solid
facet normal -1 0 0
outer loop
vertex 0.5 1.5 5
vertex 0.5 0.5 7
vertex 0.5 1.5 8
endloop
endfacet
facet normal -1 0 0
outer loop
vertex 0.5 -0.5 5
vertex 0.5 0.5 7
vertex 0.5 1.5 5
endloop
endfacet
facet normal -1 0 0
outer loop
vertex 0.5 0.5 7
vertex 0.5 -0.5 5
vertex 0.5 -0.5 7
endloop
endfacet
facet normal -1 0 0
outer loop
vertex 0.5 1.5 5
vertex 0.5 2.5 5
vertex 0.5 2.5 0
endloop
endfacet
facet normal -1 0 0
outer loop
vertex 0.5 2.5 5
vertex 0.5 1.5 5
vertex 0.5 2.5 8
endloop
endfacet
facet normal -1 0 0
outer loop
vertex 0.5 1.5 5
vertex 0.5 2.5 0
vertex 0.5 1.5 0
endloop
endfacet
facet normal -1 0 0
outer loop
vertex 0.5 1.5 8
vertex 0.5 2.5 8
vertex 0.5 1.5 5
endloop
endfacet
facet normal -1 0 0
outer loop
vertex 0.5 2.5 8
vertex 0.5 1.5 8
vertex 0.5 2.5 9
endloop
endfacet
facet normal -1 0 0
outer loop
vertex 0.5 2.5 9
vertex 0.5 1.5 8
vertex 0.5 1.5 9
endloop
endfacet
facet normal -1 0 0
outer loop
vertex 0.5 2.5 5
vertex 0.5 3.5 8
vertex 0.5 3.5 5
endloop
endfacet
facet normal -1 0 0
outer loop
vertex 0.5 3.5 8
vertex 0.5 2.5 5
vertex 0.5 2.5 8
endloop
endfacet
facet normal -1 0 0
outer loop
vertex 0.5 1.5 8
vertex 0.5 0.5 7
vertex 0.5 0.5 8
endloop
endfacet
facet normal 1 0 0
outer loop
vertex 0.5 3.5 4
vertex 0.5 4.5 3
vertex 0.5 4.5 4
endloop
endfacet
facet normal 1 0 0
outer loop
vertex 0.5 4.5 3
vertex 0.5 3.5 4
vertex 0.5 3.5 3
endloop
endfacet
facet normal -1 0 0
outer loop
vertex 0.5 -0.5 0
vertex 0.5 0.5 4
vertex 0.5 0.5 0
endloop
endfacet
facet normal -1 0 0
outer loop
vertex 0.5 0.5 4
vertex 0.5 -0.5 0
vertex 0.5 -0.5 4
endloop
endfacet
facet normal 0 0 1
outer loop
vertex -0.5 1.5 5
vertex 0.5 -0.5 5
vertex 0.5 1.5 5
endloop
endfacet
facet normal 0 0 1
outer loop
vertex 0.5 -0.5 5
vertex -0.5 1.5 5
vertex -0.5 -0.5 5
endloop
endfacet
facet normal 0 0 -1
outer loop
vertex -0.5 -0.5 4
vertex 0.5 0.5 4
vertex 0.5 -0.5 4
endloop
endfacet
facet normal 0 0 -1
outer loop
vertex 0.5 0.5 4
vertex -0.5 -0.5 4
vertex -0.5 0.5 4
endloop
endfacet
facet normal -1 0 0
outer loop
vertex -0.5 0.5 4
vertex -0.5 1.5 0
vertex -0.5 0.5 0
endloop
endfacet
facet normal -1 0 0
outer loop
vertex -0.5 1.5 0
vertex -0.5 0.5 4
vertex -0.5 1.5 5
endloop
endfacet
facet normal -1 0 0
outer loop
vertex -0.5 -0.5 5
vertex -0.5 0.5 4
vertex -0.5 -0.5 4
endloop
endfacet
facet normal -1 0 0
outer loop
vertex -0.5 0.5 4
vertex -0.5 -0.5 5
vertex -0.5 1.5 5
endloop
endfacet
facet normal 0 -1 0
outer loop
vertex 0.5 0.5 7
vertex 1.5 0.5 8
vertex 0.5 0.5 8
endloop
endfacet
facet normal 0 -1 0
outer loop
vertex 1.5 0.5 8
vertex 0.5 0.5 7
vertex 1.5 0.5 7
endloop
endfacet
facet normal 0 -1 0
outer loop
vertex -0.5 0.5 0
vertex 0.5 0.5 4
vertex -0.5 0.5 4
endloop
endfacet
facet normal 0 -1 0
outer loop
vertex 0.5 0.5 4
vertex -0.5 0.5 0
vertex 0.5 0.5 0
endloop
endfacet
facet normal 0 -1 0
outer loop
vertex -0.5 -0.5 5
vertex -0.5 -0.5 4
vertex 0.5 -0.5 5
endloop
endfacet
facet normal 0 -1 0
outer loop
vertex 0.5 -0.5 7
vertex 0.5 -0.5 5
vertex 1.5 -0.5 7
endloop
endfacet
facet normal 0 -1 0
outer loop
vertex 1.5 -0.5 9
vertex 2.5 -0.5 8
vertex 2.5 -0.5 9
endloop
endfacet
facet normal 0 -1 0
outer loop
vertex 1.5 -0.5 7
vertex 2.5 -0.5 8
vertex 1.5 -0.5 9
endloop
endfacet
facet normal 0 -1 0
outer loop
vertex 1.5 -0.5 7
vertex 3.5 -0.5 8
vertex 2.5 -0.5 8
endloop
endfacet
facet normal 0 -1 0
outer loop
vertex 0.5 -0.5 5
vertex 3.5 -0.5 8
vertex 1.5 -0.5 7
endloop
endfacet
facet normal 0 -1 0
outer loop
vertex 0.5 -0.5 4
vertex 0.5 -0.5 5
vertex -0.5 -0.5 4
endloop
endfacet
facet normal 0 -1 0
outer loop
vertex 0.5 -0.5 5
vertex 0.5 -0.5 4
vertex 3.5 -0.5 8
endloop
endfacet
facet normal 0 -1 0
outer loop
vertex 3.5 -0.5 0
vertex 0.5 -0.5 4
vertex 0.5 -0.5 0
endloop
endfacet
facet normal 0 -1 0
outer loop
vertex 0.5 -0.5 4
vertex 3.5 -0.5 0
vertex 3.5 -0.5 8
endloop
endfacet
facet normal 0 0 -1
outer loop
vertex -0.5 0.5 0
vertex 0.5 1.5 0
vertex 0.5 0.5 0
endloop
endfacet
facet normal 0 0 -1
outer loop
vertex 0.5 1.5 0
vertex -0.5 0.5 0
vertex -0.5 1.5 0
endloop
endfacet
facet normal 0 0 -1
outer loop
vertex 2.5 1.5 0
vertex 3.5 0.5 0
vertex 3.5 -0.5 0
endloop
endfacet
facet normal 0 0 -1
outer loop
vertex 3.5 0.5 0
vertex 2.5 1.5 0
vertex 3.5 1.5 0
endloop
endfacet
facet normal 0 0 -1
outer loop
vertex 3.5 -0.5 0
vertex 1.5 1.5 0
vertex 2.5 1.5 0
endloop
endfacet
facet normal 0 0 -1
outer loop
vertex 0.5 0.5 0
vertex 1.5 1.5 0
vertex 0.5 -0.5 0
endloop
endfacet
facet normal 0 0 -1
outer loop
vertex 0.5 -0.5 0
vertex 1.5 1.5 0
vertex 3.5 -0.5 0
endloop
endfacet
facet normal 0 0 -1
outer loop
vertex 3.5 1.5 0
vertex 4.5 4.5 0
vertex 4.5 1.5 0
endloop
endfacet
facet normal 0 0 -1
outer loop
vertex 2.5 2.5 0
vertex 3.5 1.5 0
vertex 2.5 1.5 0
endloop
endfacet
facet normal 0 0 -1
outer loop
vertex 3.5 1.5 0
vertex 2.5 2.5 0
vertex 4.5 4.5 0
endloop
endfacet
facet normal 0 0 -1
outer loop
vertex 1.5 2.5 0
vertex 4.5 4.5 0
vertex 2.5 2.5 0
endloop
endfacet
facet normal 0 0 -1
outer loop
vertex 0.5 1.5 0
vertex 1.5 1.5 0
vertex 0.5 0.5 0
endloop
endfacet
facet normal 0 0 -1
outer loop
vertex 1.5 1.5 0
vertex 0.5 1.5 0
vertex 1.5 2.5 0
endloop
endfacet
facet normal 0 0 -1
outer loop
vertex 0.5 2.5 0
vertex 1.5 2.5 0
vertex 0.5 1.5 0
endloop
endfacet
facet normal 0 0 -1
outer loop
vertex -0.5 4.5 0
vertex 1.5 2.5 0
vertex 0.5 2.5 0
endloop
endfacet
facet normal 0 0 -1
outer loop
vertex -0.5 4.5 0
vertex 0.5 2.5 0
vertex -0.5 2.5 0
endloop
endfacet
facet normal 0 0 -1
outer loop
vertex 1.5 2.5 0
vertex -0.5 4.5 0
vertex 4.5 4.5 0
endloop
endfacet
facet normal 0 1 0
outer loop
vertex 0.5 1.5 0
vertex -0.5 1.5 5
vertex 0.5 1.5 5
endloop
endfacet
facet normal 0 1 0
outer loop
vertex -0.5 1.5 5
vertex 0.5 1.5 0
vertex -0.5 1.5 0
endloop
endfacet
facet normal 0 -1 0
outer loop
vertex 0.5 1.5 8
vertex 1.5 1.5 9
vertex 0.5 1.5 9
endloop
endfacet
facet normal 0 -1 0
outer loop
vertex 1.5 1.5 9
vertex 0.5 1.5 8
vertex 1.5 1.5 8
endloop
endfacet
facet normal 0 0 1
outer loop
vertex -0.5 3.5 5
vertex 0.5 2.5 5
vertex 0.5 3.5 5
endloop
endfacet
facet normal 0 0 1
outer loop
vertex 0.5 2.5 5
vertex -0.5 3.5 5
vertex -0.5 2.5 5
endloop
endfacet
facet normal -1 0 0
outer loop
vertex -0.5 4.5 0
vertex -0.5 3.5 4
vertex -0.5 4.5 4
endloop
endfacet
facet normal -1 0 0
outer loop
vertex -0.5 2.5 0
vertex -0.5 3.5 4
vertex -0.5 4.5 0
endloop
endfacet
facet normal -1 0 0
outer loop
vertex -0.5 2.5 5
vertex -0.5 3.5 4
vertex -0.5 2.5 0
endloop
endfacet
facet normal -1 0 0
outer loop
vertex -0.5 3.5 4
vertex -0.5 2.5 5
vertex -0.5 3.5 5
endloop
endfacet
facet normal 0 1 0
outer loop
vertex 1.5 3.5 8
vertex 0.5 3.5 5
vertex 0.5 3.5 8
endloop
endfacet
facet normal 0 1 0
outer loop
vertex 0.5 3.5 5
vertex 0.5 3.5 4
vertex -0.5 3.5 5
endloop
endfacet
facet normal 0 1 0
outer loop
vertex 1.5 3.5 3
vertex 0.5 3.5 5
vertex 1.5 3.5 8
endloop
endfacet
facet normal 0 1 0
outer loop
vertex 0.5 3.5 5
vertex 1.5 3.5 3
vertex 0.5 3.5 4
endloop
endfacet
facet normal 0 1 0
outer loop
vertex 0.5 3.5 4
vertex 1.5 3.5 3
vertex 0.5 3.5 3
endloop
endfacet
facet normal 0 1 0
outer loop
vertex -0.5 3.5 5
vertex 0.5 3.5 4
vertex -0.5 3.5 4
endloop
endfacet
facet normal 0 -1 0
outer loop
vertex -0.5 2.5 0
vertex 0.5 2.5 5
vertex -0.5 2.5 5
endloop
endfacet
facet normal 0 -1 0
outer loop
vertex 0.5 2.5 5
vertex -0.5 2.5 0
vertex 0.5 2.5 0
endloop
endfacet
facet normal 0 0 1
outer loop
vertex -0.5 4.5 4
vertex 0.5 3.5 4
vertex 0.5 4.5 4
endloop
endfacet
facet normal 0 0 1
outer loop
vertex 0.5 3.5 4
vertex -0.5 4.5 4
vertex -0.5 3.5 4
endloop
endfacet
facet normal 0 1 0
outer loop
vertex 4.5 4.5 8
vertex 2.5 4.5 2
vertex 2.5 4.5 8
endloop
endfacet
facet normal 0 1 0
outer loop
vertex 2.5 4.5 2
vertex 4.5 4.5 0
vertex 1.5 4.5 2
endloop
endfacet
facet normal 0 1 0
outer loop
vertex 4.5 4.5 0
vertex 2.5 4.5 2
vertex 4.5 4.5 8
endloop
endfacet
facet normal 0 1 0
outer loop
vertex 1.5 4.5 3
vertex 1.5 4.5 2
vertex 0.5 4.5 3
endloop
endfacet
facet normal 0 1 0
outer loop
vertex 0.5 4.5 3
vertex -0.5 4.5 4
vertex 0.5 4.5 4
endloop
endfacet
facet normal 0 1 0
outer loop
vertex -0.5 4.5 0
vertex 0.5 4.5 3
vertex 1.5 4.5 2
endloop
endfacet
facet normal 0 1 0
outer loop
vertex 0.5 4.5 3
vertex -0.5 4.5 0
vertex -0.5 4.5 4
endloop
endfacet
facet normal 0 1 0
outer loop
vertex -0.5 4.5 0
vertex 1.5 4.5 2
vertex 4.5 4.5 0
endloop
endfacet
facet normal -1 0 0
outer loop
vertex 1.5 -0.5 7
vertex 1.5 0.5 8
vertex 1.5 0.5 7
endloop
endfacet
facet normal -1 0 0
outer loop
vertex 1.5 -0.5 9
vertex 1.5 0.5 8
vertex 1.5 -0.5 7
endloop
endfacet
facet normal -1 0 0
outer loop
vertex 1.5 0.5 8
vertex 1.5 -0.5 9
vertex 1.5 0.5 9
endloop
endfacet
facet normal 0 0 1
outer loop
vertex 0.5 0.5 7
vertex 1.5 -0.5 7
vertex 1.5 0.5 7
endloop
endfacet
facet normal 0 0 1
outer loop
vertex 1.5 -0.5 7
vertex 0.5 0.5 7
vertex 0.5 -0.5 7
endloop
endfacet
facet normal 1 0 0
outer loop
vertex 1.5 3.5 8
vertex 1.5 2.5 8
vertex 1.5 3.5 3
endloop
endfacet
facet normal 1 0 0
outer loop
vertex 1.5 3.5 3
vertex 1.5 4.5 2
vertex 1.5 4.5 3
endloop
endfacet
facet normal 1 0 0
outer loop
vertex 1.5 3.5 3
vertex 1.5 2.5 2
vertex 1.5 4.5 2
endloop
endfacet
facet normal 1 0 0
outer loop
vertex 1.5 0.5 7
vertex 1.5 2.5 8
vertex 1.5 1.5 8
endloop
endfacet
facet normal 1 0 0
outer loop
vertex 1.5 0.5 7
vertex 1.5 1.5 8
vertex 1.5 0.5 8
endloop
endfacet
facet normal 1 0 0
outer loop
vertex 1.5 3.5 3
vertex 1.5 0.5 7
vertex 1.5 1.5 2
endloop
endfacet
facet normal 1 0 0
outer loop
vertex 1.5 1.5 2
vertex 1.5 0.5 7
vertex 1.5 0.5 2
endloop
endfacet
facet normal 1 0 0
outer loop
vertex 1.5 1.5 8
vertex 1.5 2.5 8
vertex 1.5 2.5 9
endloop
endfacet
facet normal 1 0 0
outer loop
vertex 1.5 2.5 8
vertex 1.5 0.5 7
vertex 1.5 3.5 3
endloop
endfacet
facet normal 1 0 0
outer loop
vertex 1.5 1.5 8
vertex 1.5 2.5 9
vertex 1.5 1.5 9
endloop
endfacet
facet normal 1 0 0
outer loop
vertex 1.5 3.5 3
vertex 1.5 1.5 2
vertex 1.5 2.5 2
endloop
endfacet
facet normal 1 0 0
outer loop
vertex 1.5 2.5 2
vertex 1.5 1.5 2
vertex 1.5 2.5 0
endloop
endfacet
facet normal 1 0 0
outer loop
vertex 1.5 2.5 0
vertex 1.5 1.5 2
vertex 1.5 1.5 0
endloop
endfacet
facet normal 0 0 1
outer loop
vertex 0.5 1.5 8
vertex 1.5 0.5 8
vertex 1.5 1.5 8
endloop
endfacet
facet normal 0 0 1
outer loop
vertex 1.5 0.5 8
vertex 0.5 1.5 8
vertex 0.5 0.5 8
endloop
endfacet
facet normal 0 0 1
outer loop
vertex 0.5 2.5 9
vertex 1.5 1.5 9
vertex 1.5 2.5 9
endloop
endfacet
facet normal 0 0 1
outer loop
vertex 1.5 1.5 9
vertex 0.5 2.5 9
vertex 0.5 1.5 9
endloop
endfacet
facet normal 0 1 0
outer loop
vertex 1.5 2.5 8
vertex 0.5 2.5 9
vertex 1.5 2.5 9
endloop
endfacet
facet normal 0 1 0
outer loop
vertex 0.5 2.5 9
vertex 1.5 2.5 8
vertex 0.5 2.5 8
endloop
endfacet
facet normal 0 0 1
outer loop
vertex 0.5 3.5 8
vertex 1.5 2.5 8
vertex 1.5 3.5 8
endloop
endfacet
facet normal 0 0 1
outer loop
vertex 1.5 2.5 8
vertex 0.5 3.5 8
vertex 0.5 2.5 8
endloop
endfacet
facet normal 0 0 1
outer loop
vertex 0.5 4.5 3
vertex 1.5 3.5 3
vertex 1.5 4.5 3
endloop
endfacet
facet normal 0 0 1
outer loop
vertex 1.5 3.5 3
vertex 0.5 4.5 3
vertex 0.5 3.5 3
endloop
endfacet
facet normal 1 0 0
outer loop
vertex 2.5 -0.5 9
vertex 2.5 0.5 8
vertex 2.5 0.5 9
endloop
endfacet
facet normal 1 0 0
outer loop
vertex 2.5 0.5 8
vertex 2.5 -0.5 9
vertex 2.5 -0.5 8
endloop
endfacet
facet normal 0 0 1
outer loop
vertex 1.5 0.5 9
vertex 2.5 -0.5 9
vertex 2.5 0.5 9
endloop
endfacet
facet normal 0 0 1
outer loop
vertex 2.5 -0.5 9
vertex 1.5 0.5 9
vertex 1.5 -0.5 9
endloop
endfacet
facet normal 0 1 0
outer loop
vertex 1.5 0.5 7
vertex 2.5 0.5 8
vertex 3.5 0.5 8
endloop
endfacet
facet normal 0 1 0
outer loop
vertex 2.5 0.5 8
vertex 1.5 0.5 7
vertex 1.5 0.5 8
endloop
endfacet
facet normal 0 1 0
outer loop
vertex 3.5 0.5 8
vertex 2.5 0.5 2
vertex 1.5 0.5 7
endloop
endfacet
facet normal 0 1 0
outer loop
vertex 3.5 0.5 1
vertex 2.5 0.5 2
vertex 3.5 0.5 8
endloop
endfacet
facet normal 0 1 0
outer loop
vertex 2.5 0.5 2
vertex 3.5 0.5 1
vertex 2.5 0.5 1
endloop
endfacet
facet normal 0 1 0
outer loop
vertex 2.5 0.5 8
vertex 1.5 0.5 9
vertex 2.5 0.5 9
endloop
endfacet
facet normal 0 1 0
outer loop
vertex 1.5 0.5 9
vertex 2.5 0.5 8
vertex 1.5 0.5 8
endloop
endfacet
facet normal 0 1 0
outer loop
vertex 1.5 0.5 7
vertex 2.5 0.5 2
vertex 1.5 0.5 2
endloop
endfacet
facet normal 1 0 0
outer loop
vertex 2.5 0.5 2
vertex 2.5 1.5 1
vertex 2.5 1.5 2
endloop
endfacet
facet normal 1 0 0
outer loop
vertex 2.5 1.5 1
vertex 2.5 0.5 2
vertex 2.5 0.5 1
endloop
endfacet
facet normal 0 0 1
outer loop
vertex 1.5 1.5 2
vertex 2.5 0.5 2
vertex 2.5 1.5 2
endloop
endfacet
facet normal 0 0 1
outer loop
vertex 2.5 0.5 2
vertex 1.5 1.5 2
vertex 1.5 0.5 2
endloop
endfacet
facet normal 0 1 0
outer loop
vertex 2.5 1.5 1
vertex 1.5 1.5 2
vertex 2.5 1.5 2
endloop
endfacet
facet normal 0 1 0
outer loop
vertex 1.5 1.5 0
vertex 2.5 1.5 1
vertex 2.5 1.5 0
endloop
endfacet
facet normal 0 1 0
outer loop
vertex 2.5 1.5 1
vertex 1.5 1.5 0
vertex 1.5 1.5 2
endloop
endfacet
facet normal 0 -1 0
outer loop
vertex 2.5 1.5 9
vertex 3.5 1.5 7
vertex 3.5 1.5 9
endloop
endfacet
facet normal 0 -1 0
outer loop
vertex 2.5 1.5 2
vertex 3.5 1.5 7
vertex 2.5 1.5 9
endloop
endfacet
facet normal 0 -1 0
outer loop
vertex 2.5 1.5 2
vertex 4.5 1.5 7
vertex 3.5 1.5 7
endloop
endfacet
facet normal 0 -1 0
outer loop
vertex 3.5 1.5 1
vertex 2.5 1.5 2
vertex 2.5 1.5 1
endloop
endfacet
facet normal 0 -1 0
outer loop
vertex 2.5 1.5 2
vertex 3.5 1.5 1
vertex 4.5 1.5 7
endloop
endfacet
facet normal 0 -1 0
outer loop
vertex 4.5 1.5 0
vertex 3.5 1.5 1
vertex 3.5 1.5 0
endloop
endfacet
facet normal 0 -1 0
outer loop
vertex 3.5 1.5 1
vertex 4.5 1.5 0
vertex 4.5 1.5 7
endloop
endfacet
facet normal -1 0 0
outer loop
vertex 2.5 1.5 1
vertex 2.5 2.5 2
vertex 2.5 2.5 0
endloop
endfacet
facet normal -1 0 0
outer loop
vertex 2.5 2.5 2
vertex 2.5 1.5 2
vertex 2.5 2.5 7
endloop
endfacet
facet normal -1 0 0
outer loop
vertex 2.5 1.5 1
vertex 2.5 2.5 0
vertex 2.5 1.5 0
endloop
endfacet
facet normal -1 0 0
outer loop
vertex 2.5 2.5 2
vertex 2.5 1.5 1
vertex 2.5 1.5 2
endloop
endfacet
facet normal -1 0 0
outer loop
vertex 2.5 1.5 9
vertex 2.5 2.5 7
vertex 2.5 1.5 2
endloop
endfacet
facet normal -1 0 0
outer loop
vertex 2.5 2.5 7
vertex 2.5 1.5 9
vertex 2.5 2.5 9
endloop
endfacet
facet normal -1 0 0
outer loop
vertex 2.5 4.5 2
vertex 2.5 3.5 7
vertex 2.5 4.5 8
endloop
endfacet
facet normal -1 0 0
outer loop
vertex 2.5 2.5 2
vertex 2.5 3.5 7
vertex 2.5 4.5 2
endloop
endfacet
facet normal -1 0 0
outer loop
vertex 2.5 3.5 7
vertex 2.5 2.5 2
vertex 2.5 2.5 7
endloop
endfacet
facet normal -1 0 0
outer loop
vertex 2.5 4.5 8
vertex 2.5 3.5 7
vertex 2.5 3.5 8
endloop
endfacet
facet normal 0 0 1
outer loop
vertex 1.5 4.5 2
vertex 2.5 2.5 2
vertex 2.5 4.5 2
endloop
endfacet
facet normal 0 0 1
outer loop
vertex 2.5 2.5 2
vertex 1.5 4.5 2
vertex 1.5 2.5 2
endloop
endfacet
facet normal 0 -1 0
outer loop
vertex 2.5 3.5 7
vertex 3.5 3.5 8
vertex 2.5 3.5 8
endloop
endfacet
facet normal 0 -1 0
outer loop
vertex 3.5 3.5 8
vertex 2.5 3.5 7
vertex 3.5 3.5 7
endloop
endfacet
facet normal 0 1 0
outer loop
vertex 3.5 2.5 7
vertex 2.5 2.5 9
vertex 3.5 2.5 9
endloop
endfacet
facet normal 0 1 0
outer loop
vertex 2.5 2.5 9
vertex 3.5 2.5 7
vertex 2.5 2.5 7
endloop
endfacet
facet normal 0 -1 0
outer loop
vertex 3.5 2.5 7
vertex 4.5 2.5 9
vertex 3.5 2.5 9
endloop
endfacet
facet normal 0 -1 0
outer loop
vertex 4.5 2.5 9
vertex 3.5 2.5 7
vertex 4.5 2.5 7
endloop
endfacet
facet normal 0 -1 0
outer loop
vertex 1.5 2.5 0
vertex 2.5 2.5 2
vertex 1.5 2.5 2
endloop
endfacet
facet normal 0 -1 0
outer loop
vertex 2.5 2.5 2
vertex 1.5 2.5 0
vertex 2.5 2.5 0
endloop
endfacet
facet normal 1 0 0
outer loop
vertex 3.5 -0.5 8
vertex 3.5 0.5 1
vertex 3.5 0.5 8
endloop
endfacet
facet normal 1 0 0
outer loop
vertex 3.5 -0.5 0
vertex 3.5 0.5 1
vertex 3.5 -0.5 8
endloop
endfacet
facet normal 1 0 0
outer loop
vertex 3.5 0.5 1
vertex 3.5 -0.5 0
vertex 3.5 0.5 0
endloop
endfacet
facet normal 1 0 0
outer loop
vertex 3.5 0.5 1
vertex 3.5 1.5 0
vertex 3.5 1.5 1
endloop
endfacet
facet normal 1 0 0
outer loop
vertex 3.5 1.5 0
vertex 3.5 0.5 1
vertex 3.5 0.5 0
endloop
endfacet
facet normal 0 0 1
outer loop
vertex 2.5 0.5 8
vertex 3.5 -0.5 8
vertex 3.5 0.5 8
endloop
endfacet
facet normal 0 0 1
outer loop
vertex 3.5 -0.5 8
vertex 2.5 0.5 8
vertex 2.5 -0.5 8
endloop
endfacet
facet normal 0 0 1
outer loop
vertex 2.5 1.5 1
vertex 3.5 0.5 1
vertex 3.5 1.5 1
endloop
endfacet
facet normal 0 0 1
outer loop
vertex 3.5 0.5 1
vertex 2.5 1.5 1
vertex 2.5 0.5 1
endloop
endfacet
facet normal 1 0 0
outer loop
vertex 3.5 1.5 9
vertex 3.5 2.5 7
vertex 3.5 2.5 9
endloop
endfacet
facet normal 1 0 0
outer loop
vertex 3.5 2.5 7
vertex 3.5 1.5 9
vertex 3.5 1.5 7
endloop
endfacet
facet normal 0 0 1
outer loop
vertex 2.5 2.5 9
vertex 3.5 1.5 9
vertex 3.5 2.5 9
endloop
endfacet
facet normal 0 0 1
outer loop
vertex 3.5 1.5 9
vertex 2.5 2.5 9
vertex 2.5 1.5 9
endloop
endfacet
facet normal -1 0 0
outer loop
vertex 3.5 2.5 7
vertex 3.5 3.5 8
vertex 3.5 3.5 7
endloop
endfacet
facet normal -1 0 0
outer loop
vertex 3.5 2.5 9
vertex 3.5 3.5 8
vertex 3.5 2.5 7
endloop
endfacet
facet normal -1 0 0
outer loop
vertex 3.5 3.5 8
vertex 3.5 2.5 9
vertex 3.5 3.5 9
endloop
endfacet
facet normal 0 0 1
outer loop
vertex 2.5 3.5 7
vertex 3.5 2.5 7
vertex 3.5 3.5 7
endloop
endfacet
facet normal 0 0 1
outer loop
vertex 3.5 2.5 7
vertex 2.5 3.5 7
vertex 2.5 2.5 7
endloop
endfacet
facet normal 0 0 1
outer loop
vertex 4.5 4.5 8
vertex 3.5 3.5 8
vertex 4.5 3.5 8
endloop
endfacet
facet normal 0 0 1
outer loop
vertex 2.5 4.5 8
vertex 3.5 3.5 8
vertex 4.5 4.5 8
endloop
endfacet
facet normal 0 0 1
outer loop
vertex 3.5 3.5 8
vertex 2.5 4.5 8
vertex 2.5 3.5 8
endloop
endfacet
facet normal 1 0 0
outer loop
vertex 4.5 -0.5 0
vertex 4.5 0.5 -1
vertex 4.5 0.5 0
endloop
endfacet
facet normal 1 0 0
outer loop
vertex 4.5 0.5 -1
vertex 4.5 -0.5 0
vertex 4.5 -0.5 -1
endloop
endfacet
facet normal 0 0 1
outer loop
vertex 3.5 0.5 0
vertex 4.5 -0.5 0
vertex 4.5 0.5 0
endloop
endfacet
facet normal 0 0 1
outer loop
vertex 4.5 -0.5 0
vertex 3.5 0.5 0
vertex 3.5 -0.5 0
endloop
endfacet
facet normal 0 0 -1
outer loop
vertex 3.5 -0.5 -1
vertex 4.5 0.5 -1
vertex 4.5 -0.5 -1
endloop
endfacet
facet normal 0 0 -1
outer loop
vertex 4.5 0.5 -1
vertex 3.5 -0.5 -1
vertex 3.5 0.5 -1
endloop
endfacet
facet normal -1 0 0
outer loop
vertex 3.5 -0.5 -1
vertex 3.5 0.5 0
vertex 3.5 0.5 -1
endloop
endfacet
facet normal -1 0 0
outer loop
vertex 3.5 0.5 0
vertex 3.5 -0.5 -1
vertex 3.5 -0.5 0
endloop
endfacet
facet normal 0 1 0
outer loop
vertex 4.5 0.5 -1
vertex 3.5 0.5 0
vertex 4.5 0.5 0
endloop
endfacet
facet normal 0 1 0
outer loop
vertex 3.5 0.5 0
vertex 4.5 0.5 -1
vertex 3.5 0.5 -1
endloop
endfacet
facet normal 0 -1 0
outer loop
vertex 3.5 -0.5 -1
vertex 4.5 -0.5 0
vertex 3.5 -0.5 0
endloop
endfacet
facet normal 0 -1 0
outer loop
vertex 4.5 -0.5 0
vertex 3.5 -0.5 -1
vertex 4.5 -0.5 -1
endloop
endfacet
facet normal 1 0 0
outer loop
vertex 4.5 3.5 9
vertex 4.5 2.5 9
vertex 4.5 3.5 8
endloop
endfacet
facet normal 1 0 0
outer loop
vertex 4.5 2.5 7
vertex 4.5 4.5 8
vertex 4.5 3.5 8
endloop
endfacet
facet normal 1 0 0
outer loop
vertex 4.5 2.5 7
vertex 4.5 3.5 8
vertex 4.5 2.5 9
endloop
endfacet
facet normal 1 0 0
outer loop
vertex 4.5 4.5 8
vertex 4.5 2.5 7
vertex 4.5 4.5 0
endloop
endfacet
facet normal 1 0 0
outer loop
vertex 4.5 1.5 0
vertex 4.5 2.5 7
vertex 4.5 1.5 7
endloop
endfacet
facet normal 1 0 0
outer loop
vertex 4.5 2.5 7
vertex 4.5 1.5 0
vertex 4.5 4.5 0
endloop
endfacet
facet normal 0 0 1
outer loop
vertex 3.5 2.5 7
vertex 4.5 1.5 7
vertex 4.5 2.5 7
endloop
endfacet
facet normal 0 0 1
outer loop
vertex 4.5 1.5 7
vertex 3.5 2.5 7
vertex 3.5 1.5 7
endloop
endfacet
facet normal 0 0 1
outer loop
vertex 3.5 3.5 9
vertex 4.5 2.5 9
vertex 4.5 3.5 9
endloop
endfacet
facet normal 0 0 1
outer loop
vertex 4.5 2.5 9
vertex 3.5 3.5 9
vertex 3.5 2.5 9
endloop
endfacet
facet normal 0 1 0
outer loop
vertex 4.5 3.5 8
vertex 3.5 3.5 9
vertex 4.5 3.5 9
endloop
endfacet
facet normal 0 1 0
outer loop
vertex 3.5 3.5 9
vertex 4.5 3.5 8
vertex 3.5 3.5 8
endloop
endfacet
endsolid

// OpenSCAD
union() {
    translate([0, 0, 4.5]) color([1, 0, 0]) cube([1, 1, 1], center=true);
    translate([0, 1, 2.5]) cube([1, 1, 5], center=true);
    translate([0, 3, 2.5]) cube([1, 1, 5], center=true);
    translate([0, 4, 2.0]) cube([1, 1, 4], center=true);
    translate([1, 0, 3.5]) cube([1, 1, 7], center=true);
    translate([1, 1, 4.0]) cube([1, 1, 8], center=true);
    translate([1, 2, 4.5]) cube([1, 1, 9], center=true);
    translate([1, 3, 4.0]) cube([1, 1, 8], center=true);
    translate([1, 4, 1.5]) cube([1, 1, 3], center=true);
    translate([2, 0, 4.5]) cube([1, 1, 9], center=true);
    translate([2, 1, 1.0]) cube([1, 1, 2], center=true);
    translate([2, 3, 1.0]) cube([1, 1, 2], center=true);
    translate([2, 4, 1.0]) cube([1, 1, 2], center=true);
    translate([3, 0, 4.0]) cube([1, 1, 8], center=true);
    translate([3, 1, 0.5]) cube([1, 1, 1], center=true);
    translate([3, 2, 4.5]) cube([1, 1, 9], center=true);
    translate([3, 3, 3.5]) cube([1, 1, 7], center=true);
    translate([3, 4, 4.0]) cube([1, 1, 8], center=true);
    translate([4, 0, -0.5]) color([0, 0, 1]) cube([1, 1, 1], center=true);
    translate([4, 2, 3.5]) cube([1, 1, 7], center=true);
    translate([4, 3, 4.5]) cube([1, 1, 9], center=true);
    translate([4, 4, 4.0]) cube([1, 1, 8], center=true);
}
